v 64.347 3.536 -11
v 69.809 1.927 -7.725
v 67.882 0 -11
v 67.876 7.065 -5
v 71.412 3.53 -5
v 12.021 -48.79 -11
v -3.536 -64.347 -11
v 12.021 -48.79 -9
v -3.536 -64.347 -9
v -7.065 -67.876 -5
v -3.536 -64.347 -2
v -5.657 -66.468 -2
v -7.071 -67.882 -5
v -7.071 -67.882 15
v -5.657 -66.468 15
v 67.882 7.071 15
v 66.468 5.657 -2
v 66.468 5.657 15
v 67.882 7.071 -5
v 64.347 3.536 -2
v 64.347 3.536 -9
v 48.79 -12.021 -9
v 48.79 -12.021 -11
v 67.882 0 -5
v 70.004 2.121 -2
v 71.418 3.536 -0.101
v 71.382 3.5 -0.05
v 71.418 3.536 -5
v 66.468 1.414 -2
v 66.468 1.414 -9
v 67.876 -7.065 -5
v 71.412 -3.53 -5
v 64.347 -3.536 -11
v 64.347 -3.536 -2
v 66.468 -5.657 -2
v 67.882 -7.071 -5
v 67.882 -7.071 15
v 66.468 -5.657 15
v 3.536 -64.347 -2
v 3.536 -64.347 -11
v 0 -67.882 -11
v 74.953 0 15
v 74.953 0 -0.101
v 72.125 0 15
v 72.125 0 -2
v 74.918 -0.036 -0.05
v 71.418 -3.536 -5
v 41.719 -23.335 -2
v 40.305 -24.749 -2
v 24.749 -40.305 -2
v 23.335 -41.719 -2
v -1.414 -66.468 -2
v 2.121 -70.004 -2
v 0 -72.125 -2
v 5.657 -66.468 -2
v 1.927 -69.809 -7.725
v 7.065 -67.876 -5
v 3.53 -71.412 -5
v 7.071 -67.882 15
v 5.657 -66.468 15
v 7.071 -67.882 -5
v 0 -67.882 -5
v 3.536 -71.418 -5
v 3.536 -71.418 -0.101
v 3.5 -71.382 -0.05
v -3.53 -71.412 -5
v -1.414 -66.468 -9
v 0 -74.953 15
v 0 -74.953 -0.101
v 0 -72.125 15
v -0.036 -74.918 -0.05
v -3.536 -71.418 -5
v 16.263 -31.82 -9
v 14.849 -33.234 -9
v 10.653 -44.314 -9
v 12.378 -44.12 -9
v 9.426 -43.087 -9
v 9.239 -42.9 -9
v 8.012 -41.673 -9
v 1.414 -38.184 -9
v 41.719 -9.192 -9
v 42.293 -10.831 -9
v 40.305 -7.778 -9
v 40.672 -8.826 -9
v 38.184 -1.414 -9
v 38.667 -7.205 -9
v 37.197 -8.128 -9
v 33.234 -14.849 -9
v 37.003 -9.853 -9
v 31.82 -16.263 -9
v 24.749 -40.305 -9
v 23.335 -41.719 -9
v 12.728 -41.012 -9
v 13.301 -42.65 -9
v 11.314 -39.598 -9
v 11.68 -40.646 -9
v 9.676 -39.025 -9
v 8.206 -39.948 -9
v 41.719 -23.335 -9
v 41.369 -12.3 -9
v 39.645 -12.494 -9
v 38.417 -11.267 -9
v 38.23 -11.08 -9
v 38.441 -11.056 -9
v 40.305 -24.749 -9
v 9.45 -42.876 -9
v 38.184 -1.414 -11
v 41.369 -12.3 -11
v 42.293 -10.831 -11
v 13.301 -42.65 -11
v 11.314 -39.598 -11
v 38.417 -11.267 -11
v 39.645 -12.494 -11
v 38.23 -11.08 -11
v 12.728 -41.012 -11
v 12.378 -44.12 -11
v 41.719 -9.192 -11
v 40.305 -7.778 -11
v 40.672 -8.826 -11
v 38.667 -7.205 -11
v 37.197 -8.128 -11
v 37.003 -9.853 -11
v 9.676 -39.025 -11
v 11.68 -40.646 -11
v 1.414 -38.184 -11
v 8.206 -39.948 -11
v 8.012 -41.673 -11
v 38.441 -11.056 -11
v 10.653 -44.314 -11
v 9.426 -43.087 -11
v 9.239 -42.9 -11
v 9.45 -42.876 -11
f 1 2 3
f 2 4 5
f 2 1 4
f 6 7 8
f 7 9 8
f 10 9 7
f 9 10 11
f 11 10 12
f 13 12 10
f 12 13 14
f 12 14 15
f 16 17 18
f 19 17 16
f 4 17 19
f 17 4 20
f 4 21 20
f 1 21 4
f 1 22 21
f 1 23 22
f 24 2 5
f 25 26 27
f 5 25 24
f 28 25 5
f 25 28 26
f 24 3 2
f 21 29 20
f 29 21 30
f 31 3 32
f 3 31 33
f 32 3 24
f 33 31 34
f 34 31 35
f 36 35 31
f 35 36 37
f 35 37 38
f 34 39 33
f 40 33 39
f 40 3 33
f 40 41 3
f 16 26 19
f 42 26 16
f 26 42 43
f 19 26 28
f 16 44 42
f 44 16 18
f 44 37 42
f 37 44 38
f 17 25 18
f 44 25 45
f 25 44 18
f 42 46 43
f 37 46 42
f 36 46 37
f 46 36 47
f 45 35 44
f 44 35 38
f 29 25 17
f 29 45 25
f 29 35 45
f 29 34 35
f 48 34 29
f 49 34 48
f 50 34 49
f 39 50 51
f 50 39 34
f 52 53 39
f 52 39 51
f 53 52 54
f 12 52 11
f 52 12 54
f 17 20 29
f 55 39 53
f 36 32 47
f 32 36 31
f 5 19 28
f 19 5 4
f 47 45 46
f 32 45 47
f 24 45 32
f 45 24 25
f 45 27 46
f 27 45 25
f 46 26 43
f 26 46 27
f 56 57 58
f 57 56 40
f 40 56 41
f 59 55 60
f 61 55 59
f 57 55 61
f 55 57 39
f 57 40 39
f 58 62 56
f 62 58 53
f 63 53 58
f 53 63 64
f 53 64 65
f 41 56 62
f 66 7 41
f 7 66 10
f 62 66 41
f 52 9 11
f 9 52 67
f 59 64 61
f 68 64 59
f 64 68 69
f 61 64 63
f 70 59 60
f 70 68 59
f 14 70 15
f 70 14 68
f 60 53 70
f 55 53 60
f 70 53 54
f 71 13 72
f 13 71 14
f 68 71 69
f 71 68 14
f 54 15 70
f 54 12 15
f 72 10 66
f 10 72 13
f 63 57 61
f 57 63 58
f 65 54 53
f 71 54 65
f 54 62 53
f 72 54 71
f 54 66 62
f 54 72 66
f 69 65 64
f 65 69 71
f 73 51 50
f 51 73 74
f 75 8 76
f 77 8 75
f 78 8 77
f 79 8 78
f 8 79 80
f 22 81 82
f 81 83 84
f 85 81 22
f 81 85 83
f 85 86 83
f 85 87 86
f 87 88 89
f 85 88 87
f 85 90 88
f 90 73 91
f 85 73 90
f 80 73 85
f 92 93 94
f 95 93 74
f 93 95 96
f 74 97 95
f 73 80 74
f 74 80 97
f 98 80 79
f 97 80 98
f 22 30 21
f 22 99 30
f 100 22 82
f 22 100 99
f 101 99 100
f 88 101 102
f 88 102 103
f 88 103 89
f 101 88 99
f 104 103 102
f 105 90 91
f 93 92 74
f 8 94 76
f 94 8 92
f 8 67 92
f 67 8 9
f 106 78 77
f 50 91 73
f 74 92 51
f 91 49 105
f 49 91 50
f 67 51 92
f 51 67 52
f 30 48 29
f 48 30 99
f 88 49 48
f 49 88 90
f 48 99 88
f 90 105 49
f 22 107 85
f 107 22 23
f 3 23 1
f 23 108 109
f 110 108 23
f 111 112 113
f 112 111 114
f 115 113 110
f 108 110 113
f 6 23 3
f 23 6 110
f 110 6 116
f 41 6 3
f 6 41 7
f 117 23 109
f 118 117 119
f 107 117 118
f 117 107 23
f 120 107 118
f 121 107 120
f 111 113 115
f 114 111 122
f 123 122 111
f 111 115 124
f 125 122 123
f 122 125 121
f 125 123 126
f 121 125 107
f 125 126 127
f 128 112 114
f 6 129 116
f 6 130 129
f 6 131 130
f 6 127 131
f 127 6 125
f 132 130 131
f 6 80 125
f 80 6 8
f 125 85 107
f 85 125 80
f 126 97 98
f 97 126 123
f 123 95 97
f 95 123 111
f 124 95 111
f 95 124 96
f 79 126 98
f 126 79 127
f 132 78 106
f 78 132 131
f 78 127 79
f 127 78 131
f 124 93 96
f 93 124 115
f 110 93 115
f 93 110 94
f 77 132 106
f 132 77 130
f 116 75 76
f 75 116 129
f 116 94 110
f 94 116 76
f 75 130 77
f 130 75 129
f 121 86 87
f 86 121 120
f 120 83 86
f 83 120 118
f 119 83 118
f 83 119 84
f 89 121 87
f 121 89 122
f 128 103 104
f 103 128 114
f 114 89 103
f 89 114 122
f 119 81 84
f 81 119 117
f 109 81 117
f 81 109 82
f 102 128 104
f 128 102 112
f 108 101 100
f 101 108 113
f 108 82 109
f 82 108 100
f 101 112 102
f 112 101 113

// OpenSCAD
// file: shapes.scad
/*
 *  OpenSCAD Shapes Library (www.openscad.at)
 *  Copyright (C) 2009  Catarina Mota <clifford@clifford.at>
 *
 *  This program is free software; you can redistribute it and/or modify
 *  it under the terms of the GNU General Public License as published by
 *  the Free Software Foundation; either version 2 of the License, or
 *  (at your option) any later version.
 *
 *  This program is distributed in the hope that it will be useful,
 *  but WITHOUT ANY WARRANTY; without even the implied warranty of
 *  MERCHANTABILITY or FITNESS FOR A PARTICULAR PURPOSE.  See the
 *  GNU General Public License for more details.
 *
 *  You should have received a copy of the GNU General Public License
 *  along with this program; if not, write to the Free Software
 *  Foundation, Inc., 59 Temple Place, Suite 330, Boston, MA  02111-1307  USA
 *
*/


//box(width, height, depth);
//roundedBox(width, height, depth, factor);
//cone(height, radius);
//oval(width, height, depth);
//tube(height, radius, wall);
//ovalTube(width, height, depth, wall);
//hexagon(height, depth);
//octagon(height, depth);
//dodecagon(height, depth);
//hexagram(height, depth);
//rightTriangle(adjacent, opposite, depth);
//equiTriangle(side, depth);
//12ptStar(height, depth);

//----------------------

//roundedBox(120, 60, 3, 8);

//----------------------

module box(w,h,d) {
	scale ([w,h,d]) cube(1, true);
}

module roundedBox(w,h,d,f){
	difference(){
		box(w,h,d);
		translate([-w/2,h/2,0]) cube(w/(f/2),true);
		translate([w/2,h/2,0]) cube(w/(f/2),true);
		translate([-w/2,-h/2,0]) cube(w/(f/2),true);
		translate([w/2,-h/2,0]) cube(w/(f/2),true);
	}
	translate([-w/2+w/f,h/2-w/f,-d/2]) cylinder(d,w/f, w/f);
	translate([w/2-w/f,h/2-w/f,-d/2]) cylinder(d,w/f, w/f);
	translate([-w/2+w/f,-h/2+w/f,-d/2]) cylinder(d,w/f, w/f);
	translate([w/2-w/f,-h/2+w/f,-d/2]) cylinder(d,w/f, w/f);
}

module cone(height, radius) {
		cylinder(height, radius, 0);
}

module oval(w,h,d) {
	scale ([w/100, h/100, 1]) cylinder(d, 50, 50);
}

module tube(height, radius, wall) {
	difference(){
		cylinder(height, radius, radius);
		cylinder(height, radius-wall, radius-wall);
	}
}

module ovalTube(w,h,d,wall) {
	difference(){
		scale ([w/100, h/100, 1]) cylinder(d, 50, 50);
		scale ([w/100, h/100, 1]) cylinder(d, 50-wall, 50-wall);
	}
}

module hexagon(height, depth) {
	boxWidth=height/1.75;
		union(){
			box(boxWidth, height, depth);
			rotate([0,0,60]) box(boxWidth, height, depth);
			rotate([0,0,-60]) box(boxWidth, height, depth);
		}
}

module octagon(height, depth) {
	intersection(){
		box(height, height, depth);
		rotate([0,0,45]) box(height, height, depth);
	}
}

module dodecagon(height, depth) {
	intersection(){
		hexagon(height, depth);
		rotate([0,0,90]) hexagon(height, depth);
	}
}

module hexagram(height, depth) {
	boxWidth=height/1.75;
	intersection(){
		box(height, boxWidth, depth);
		rotate([0,0,60]) box(height, boxWidth, depth);
	}
	intersection(){
		box(height, boxWidth, depth);
		rotate([0,0,-60]) box(height, boxWidth, depth);
	}
	intersection(){
		rotate([0,0,60]) box(height, boxWidth, depth);
		rotate([0,0,-60]) box(height, boxWidth, depth);
	}
}

module rightTriangle(adjacent, opposite, depth) {
	difference(){
		translate([-adjacent/2,opposite/2,0]) box(adjacent, opposite, depth);
		translate([-adjacent,0,0]){
			rotate([0,0,atan(opposite/adjacent)]) dislocateBox(adjacent*2, opposite, depth);
		}
	}
}

module equiTriangle(side, depth) {
	difference(){
		translate([-side/2,side/2,0]) box(side, side, depth);
		rotate([0,0,30]) dislocateBox(side*2, side, depth);
		translate([-side,0,0]){
			rotate([0,0,60]) dislocateBox(side*2, side, depth);
		}
	}
}

module 12ptStar(height, depth) {
	starNum=3;
	starAngle=360/starNum;
	for (s=[1:starNum]){
		rotate([0, 0, s*starAngle]) box(height, height, depth);
	}
}

//-----------------------
//MOVES THE ROTATION AXIS OF A BOX FROM ITS CENTER TO THE BOTTOM LEFT CORNER
module dislocateBox(w,h,d){
	translate([w/2,h,0]){
		difference(){
			box(w, h*2, d+1);
			translate([-w,0,0]) box(w, h*2, d+1);
		}
	}
}
// main file
include <shapes.scad>  // using Catarina Mota's shapes library


//build platform and support below
//translate ([-51,-51,0]) cube ([102,102,5]);
//translate ([-26,-43,-14]) cube ([51,85,3]);

//to fit on build platfrom (for one piece build, rotate 45 degrees)
rotate (45,0,0) difference ()
{
	union ()
	{
		//left piece
		translate ([-26,-48,-11]) cube ([52,20,2]);
		translate ([-48,-48,-11]) cube ([96,5,2]);
		translate ([-48,-48,-9]) cube ([96,2,7]);
		corner();
		translate ([0,0,0]) rotate ([0,0,270]) corner();
		translate ([-12,-46,-9]) rotate ([0,90,0]) rightTriangle(7,12,2);
		translate ([12,-46,-9]) rotate ([0,90,0]) rightTriangle(7,12,2);
	}
	translate ([-22,-36,-11]) cylinder (2,2,2);
	translate ([-22,-38,-11]) cylinder (2,2,2);
	translate ([21,-34,-11]) cylinder (2,2,2);
	translate ([21,-36,-11]) cylinder (2,2,2);
}

module corner ()
{
difference ()
{
union ()
	{
	translate ([51,-53,-3]) cube ([2,10,18]);
	translate ([43,-53,-3]) cube ([10,2,18]);
	translate ([43,-53,-5]) cube ([10,5,3]);
	translate ([48,-53,-5]) cube ([5,10,3]);
	translate ([48,-45.5,-4.99]) rotate ([90,270,180]) rightTriangle(6.01,5,5);
	translate ([45.5,-48,-4.99]) rotate ([90,270,90]) rightTriangle(6.01,5,5);
	}
translate ([48,-48,-5])  rotate ([90,45,0]) cube ([7,7,5.5]);
}
}
